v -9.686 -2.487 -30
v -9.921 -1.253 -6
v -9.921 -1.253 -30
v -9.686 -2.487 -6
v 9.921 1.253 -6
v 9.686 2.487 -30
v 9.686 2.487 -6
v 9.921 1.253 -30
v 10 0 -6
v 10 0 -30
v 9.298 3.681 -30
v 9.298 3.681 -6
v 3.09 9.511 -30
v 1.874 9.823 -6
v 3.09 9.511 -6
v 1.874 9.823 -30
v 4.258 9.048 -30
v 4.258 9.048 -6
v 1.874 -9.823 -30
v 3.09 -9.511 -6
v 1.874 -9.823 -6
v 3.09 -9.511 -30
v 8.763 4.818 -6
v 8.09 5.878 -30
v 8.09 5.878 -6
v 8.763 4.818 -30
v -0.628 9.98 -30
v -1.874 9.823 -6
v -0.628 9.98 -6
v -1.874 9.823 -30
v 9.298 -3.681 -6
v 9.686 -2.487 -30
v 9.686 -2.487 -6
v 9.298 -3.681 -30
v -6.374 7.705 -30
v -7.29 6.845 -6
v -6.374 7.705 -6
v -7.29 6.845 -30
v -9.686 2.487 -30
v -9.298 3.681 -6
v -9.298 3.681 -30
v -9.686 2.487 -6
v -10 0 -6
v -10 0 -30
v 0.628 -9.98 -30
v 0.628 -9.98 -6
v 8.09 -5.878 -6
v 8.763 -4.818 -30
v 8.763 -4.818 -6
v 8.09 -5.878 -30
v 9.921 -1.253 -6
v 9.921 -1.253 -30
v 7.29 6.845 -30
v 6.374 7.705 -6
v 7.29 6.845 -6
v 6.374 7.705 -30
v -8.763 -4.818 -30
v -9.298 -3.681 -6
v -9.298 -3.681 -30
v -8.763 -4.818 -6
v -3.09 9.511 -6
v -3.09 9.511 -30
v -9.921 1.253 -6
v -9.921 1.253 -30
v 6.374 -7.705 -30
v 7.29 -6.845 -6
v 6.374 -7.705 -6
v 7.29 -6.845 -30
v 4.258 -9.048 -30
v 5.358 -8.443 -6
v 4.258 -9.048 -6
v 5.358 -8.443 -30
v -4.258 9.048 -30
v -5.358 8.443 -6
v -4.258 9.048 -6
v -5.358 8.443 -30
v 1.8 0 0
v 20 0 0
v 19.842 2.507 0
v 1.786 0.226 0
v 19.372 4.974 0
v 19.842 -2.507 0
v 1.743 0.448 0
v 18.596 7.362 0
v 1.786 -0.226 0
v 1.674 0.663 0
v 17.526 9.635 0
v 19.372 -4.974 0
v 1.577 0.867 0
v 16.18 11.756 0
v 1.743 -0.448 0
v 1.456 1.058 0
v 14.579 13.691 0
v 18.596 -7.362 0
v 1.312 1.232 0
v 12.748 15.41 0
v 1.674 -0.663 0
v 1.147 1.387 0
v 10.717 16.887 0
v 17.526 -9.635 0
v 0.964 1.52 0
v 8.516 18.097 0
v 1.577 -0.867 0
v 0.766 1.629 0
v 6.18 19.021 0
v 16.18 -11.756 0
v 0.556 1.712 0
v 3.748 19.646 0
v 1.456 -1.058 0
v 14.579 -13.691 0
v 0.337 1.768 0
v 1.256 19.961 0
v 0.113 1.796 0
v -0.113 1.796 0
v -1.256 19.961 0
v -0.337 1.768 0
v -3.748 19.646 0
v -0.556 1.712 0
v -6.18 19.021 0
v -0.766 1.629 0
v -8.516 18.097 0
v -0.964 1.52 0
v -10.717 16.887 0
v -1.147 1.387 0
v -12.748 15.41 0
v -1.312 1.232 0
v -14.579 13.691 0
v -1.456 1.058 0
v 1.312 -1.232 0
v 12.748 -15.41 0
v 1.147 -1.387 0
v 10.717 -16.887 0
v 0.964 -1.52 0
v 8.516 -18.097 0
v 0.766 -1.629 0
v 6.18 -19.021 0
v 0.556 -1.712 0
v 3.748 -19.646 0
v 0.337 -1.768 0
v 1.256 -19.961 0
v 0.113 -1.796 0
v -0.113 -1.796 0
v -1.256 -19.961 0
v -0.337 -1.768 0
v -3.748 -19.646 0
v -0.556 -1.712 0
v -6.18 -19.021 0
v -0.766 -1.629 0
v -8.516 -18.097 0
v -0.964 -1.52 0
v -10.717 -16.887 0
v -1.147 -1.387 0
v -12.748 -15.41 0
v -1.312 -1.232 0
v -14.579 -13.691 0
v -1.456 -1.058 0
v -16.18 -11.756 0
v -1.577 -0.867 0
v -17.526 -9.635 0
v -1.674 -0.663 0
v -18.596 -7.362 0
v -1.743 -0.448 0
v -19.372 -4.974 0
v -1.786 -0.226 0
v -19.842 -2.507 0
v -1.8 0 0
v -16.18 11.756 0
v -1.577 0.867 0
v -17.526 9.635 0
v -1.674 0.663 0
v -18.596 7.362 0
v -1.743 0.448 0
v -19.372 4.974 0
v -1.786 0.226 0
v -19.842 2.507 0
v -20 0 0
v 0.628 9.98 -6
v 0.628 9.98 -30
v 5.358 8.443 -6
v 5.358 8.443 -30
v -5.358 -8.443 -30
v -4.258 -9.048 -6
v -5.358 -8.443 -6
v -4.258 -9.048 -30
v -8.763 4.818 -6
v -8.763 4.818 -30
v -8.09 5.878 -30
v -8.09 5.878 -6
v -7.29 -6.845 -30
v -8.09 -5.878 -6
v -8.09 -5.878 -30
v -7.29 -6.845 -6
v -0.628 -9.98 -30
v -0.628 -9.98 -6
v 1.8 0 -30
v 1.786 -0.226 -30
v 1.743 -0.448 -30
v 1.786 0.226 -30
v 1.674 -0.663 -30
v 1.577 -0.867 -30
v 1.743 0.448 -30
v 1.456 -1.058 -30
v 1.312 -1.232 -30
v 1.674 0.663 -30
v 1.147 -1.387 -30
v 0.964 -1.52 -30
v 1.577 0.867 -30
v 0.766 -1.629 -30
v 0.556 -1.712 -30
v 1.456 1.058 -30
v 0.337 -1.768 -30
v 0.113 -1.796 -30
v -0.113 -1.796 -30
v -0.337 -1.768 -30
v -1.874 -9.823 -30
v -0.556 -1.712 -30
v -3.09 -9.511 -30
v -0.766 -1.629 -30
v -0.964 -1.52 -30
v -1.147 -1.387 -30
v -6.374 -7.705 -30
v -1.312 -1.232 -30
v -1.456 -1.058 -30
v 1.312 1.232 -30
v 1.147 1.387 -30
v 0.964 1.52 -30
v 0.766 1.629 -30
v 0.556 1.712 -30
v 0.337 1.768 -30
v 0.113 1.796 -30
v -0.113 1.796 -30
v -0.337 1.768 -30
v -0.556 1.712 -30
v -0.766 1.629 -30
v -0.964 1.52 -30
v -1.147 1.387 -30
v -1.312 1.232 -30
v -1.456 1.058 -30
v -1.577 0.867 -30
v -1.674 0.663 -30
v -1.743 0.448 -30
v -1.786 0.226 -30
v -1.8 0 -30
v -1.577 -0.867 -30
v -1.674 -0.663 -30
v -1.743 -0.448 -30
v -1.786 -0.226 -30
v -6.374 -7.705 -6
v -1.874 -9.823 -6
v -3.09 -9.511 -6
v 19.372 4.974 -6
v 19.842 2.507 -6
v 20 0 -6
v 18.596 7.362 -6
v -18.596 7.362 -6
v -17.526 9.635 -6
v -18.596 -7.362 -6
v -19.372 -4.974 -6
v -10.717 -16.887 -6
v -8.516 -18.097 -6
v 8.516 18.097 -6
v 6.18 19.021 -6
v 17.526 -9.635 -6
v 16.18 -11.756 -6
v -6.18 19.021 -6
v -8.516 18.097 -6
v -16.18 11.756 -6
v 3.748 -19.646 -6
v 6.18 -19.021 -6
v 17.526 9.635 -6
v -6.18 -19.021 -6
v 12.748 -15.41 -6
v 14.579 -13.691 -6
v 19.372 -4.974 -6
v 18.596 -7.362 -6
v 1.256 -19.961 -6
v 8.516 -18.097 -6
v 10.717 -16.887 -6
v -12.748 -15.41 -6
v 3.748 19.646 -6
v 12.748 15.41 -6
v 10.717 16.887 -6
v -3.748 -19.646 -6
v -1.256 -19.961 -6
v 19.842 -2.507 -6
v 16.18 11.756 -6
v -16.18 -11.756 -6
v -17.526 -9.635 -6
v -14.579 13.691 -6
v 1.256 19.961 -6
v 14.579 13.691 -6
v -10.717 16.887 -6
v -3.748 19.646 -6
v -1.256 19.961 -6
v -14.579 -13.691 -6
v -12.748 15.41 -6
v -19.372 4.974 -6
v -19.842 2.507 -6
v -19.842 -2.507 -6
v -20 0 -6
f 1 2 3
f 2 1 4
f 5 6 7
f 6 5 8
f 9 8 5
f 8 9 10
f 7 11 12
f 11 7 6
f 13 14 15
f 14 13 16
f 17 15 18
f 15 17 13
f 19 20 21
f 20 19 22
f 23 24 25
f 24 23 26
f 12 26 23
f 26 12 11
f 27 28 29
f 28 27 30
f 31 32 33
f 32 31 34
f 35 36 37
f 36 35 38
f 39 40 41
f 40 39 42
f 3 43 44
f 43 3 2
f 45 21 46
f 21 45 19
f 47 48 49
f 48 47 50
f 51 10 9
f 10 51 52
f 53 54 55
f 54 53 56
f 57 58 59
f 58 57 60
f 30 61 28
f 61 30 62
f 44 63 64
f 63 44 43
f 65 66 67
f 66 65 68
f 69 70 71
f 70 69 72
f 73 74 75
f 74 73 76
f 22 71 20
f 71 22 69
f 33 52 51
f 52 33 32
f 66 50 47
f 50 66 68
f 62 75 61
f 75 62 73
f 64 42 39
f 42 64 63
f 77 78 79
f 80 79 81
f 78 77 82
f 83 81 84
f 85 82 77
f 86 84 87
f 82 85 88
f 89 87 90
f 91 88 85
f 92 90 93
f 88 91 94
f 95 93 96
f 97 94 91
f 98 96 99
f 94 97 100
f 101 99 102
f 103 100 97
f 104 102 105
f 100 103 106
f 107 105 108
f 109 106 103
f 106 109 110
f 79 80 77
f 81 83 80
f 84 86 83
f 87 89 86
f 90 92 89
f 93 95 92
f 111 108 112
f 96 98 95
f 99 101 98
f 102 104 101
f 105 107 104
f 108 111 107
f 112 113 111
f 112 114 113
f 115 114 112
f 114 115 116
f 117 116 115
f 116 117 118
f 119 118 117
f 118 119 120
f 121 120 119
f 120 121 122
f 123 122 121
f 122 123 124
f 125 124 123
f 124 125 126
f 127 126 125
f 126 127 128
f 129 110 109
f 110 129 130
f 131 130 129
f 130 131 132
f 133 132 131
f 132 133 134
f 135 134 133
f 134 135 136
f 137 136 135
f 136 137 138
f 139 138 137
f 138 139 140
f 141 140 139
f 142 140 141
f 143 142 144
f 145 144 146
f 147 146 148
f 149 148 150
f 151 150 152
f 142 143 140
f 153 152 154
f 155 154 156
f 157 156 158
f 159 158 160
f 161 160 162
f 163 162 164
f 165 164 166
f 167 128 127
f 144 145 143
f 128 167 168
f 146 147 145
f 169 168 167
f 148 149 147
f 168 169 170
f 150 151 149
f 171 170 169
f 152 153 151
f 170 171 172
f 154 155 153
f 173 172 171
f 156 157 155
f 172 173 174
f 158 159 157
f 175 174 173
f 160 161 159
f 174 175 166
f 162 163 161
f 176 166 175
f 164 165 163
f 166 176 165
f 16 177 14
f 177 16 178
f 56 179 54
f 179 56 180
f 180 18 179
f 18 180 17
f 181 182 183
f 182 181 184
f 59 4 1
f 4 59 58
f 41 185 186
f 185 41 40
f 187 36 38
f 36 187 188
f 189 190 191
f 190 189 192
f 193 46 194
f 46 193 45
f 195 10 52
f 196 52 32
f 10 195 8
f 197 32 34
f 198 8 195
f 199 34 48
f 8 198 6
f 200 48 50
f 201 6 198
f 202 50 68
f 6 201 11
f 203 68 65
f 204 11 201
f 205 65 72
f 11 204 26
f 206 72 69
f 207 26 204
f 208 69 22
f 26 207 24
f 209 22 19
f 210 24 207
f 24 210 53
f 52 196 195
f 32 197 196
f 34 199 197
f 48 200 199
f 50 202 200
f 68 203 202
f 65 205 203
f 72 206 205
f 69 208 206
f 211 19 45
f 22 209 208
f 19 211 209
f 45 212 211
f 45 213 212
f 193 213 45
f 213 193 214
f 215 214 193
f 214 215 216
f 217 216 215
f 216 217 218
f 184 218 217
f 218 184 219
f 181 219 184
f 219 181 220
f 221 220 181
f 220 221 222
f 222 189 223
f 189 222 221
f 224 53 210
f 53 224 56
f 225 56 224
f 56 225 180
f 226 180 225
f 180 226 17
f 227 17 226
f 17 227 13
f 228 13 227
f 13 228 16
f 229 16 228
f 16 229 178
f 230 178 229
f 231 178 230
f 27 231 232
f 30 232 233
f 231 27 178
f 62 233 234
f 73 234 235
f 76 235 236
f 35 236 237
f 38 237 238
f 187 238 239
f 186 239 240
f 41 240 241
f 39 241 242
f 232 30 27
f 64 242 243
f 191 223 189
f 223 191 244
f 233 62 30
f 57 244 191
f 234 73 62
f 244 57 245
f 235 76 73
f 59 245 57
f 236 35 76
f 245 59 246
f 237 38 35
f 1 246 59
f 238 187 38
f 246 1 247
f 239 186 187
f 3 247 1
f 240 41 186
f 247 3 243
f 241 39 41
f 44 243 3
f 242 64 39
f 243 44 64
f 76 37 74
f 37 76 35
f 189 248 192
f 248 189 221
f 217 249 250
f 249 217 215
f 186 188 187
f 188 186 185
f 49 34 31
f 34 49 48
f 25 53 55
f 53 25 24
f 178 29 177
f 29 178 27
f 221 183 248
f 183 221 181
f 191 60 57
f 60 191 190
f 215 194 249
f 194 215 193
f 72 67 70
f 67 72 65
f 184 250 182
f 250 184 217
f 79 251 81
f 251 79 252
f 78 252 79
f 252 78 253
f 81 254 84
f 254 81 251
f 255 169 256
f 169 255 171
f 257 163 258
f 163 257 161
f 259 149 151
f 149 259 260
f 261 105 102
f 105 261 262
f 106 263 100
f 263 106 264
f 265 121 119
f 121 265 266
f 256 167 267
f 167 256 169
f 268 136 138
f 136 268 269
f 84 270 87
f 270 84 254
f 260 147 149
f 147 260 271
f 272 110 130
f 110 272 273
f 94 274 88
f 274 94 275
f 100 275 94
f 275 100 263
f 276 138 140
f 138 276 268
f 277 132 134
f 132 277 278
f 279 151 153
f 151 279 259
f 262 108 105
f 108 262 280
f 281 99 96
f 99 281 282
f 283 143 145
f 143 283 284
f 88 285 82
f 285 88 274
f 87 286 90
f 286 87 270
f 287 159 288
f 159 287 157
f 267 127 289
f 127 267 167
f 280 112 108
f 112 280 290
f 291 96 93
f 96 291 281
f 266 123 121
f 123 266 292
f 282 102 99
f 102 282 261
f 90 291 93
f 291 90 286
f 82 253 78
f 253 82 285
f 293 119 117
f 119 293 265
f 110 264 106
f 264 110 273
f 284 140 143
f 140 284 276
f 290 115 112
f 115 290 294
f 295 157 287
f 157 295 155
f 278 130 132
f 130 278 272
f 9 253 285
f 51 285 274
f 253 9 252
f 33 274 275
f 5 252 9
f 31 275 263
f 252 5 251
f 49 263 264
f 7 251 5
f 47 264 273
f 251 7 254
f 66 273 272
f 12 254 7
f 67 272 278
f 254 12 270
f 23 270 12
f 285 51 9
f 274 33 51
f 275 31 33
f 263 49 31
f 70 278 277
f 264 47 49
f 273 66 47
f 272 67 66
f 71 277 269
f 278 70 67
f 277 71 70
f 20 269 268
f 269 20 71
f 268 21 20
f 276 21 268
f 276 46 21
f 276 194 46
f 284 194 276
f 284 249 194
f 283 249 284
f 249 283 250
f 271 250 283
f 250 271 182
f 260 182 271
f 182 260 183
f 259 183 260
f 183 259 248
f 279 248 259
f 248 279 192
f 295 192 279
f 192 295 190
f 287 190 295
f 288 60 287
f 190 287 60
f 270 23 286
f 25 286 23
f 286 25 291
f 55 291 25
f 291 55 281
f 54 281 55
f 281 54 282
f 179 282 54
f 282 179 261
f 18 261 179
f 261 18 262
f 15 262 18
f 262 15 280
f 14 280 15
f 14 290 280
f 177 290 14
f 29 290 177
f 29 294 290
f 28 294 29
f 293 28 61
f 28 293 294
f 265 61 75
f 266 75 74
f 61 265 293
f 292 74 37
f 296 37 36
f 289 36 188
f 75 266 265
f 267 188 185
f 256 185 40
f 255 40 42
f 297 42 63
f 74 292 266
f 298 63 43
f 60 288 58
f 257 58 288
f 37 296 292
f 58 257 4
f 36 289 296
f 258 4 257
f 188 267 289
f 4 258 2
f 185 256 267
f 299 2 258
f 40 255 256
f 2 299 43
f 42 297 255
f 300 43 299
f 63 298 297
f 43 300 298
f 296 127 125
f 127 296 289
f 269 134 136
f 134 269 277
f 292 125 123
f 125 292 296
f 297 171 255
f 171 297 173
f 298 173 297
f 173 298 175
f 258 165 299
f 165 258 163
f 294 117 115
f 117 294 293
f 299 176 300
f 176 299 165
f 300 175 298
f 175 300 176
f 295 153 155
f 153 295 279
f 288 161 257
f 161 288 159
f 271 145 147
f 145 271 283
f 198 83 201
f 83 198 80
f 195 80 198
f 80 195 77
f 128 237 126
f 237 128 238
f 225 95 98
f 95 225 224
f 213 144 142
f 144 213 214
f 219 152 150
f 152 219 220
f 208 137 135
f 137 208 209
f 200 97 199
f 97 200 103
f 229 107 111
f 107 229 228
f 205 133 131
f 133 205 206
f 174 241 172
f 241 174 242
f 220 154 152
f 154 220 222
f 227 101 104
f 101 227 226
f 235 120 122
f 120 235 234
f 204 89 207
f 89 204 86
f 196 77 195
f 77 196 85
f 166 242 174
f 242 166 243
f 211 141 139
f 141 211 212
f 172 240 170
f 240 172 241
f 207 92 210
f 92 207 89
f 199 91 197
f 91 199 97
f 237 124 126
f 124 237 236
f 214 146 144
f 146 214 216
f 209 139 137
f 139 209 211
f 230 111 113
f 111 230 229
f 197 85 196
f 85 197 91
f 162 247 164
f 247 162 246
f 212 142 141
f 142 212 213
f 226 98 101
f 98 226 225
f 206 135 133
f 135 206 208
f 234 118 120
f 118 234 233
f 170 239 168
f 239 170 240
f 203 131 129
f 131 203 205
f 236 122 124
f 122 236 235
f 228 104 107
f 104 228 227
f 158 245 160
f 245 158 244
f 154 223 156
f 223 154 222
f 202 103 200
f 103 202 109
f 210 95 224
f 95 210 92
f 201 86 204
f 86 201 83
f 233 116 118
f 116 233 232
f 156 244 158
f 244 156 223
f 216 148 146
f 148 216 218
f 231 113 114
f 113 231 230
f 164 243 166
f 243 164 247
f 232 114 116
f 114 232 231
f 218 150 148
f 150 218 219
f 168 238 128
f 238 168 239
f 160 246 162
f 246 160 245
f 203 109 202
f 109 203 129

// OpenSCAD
$fn = 50;


difference() {
	union() {
		translate(v = [0, 0, -30.0000000000]) {
			cylinder(h = 30, r = 10.0000000000);
		}
		translate(v = [0, 0, -6.0000000000]) {
			cylinder(h = 6, r = 20.0000000000);
		}
	}
	union() {
		#translate(v = [0, 0, -30]) {
			cylinder(h = 30, r = 1.8000000000);
		}
	}
}
